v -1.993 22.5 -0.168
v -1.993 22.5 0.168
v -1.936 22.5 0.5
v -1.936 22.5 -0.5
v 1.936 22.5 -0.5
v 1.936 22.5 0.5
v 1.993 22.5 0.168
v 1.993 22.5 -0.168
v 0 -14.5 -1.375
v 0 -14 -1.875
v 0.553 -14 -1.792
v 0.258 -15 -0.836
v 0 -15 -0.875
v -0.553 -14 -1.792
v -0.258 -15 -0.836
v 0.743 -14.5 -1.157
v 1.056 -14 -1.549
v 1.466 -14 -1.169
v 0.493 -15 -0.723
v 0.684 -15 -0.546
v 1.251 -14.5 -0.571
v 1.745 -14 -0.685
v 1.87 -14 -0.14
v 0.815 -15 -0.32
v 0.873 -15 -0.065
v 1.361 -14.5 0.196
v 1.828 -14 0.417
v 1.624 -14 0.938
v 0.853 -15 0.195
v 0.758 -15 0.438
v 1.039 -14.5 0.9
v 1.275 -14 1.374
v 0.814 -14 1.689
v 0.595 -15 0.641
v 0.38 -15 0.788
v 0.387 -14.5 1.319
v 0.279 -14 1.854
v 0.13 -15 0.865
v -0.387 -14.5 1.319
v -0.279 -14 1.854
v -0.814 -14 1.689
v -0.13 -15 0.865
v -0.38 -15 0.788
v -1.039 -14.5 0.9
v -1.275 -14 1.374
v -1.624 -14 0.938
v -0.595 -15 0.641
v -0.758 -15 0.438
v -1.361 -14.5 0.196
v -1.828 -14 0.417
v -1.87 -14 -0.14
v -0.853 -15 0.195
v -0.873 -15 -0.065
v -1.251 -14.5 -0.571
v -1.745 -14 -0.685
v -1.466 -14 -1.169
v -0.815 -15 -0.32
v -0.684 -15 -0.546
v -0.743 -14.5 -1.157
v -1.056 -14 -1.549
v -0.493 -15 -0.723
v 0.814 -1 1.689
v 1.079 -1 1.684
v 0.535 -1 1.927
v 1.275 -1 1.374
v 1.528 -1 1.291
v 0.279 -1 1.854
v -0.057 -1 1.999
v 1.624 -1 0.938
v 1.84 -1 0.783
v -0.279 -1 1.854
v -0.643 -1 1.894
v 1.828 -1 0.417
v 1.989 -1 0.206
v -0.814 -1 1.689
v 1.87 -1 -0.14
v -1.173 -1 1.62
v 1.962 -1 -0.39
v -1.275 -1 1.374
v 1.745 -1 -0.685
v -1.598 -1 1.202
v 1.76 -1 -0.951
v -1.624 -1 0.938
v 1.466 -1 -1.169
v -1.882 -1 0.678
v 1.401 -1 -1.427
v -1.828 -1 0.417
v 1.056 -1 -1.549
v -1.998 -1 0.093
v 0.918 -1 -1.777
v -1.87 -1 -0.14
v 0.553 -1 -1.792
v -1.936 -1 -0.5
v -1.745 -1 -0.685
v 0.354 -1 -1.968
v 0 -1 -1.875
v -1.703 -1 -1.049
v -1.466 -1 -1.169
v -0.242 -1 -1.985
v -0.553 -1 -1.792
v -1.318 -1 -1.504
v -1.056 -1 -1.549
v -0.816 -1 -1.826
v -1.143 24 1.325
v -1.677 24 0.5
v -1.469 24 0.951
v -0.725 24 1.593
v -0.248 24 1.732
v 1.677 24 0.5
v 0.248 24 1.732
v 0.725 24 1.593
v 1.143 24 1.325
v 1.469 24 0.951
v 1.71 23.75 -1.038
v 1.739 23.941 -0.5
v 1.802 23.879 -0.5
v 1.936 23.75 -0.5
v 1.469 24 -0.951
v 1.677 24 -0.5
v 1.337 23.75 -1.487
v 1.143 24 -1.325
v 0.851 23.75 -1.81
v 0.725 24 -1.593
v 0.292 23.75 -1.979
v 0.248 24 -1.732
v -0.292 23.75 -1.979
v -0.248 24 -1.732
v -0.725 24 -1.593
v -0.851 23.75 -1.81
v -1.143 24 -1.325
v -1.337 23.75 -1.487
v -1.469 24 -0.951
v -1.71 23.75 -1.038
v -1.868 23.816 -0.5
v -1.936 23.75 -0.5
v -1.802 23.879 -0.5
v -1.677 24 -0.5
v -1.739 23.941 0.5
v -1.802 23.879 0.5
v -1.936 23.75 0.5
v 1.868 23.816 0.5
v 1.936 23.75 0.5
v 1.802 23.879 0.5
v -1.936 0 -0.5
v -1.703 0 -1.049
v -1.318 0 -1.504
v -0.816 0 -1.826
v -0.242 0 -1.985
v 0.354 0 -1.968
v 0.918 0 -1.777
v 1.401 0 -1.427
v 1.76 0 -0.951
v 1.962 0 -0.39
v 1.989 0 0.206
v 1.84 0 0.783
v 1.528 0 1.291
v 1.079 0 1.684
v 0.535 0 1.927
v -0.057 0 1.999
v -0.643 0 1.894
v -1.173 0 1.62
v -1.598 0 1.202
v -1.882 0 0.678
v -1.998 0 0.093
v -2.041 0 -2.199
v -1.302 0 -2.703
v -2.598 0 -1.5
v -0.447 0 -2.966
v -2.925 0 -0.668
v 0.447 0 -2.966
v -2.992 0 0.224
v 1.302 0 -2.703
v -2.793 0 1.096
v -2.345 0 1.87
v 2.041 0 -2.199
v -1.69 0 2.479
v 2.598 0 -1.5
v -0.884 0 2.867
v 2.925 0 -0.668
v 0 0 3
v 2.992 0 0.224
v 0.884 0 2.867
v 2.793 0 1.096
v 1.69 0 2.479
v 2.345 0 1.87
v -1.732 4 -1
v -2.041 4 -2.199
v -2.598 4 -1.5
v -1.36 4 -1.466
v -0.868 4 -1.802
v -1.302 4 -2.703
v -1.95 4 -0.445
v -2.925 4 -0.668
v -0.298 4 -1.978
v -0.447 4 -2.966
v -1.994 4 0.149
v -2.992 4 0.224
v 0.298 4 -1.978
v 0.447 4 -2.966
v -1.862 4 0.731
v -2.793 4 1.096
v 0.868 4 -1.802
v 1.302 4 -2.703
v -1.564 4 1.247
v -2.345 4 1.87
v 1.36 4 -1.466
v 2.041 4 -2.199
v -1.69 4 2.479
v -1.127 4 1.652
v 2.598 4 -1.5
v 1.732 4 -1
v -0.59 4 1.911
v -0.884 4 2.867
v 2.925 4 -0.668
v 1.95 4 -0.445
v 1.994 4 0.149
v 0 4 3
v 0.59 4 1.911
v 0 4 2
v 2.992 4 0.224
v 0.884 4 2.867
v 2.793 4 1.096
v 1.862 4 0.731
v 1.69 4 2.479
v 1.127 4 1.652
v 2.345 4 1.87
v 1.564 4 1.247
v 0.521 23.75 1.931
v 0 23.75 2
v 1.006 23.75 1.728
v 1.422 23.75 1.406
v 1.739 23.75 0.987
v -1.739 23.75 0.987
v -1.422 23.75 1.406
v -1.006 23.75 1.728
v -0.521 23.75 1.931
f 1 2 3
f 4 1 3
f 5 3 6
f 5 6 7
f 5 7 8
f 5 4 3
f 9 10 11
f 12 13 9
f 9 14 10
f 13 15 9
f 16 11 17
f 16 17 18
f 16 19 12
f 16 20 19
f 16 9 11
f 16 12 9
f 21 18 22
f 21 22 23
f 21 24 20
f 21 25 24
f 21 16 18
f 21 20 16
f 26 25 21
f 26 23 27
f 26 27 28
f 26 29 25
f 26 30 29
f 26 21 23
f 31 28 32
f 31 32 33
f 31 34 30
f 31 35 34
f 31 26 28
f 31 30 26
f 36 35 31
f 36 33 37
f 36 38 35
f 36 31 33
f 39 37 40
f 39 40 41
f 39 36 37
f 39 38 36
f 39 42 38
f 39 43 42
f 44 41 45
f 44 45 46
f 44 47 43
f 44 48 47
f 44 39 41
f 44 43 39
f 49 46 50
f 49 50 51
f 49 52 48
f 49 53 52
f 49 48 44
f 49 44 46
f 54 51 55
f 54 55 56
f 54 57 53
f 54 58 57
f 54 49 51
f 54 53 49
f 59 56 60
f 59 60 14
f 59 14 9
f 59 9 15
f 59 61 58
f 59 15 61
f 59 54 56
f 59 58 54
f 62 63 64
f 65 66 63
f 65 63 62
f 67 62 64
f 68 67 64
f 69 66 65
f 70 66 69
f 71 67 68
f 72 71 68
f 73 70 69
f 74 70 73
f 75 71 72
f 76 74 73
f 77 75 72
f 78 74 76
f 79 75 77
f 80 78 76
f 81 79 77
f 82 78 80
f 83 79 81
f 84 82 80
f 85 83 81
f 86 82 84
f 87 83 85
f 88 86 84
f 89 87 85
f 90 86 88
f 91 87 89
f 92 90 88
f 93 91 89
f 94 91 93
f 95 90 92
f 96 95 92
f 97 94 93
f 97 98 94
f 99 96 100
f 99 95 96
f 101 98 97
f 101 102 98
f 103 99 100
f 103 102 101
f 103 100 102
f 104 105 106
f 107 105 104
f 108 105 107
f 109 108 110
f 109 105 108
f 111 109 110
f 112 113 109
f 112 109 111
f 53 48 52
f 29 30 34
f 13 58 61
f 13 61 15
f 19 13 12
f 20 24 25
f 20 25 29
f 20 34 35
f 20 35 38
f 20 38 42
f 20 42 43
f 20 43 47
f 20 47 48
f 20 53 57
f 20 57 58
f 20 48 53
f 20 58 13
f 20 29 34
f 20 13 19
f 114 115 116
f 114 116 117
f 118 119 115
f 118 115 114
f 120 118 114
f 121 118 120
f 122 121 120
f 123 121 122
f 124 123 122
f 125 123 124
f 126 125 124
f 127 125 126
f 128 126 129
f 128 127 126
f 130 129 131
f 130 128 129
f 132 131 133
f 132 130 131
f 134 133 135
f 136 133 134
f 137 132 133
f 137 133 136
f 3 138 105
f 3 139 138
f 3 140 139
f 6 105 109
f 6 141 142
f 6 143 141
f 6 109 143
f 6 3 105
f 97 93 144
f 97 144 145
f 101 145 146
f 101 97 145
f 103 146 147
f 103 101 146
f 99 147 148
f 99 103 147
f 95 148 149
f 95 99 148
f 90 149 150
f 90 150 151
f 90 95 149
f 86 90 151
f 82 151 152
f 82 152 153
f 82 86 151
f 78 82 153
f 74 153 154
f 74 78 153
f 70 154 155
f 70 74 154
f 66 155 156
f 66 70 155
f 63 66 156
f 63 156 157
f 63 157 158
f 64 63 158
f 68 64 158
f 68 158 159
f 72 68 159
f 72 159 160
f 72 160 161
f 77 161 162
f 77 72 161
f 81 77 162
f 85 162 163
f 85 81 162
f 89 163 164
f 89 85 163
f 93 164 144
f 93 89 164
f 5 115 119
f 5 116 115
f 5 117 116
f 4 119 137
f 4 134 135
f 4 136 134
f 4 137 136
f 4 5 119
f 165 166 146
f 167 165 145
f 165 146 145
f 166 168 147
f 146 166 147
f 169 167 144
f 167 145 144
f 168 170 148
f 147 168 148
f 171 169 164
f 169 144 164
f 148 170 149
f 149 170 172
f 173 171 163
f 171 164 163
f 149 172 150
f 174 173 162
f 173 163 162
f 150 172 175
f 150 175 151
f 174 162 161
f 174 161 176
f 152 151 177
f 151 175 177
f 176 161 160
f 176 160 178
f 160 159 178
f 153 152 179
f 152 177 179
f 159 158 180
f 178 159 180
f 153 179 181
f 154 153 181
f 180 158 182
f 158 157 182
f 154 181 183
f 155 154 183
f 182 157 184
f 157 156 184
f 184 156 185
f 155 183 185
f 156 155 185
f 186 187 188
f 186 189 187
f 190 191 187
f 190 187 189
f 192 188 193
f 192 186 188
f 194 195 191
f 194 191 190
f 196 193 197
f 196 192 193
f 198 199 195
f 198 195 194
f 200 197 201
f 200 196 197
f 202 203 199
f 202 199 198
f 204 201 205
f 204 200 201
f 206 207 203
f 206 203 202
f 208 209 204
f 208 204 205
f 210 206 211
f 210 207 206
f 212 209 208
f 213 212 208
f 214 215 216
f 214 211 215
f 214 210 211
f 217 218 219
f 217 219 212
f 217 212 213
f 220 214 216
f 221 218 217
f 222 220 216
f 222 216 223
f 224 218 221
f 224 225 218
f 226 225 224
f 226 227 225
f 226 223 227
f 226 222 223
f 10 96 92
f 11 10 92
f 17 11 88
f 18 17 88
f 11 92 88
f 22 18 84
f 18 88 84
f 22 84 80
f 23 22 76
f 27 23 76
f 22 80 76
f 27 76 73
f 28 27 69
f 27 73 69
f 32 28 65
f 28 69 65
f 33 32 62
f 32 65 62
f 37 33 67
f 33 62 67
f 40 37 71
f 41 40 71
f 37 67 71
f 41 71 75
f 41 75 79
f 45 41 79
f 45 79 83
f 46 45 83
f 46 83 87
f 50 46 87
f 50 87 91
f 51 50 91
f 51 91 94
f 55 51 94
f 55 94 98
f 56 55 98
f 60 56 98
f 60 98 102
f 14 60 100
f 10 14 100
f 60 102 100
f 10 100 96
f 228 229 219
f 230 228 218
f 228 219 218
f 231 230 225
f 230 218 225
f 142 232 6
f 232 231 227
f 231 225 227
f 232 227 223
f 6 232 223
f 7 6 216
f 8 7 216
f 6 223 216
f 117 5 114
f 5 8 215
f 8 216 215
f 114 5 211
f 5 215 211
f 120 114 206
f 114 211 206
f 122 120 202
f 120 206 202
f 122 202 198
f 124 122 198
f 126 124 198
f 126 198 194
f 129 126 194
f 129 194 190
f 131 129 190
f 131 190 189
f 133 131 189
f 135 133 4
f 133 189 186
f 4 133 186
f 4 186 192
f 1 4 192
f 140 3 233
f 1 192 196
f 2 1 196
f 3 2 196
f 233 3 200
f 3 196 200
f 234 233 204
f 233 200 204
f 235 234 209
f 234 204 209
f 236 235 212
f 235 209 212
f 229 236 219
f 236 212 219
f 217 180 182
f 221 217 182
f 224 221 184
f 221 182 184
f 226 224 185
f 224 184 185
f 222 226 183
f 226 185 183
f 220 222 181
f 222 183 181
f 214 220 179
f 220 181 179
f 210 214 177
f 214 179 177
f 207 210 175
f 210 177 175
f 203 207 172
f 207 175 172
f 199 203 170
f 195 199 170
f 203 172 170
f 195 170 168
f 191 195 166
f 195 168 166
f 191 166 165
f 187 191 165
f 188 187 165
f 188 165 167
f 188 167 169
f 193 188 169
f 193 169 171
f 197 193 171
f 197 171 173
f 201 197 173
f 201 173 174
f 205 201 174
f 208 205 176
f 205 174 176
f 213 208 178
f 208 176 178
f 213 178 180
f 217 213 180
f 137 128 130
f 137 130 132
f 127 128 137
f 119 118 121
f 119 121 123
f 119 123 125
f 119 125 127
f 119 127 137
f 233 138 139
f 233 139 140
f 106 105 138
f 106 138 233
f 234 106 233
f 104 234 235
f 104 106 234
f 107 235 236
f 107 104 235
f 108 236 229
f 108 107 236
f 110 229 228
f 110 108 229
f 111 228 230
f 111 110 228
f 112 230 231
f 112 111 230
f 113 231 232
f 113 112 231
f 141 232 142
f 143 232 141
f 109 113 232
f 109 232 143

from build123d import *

# Parameters (mm, degrees)
ESQUISSE1_R             = 3
BOSS_EXTRU_1_DEPTH      = 4
ESQUISSE2_R             = 2
BOSS_EXTRU_2_DEPTH      = 20
CHANFREIN1_SIZE         = 0.25
ENL_V_START             = -1.5
ENL_V_MAT_EXTRU_1_DEPTH = 1.5
BOSS_EXTRU_3_START      = 1
ESQUISSE4_R             = 2
BOSS_EXTRU_3_DEPTH      = 1
ESQUISSE5_R             = 1.875
BOSS_EXTRU_4_DEPTH      = 14
CHANFREIN2_SIZE         = 1


with BuildPart() as part:
    # Esquisse1 → Boss.-Extru.1 (new body)
    with BuildSketch(Plane(origin=(0, 0, 0), x_dir=(1, 0, 0), z_dir=(0, 1, 0))):
        with Locations(Location((0, 0, 0), (0, 0, 270))):
            Circle(ESQUISSE1_R)
    extrude(amount=BOSS_EXTRU_1_DEPTH)

    # Esquisse2 → Boss.-Extru.2 (add)
    with BuildSketch(Plane(origin=(0, 4, 0), x_dir=(1, 0, 0), z_dir=(0, 1, 0))):
        with Locations(Location((0, 0, 0), (0, 0, 270))):
            Circle(ESQUISSE2_R)
    extrude(amount=BOSS_EXTRU_2_DEPTH)

    # Chanfrein1
    chanfrein1_edges = [part.edges().sort_by_distance(p)[0] for p in [
        (0, 24, -2),
    ]]
    chamfer(chanfrein1_edges, length=CHANFREIN1_SIZE)

    # Esquisse3 → Enlèv. mat.-Extru.1 (cut)
    with BuildSketch(Plane(origin=(0, 24, 0), x_dir=(1, 0, 0), z_dir=(0, 1, 0)).offset(ENL_V_START)):
        with BuildLine():
            Line((-1.936491673, -0.5), (1.936491673, -0.5))
            ThreePointArc((1.936491673, -0.5), (2, 0), (1.936491673, 0.5))
            Line((1.936491673, 0.5), (-1.936491673, 0.5))
            ThreePointArc((-1.936491673, 0.5), (-2, 0), (-1.936491673, -0.5))
        make_face()
    extrude(amount=ENL_V_MAT_EXTRU_1_DEPTH, mode=Mode.SUBTRACT)

    # Esquisse4 → Boss.-Extru.3 (add)
    with BuildSketch(Plane.XZ.offset(BOSS_EXTRU_3_START)):
        with Locations(Location((0, 0, 0), (0, 0, 194.477512186))):
            Circle(ESQUISSE4_R)
    extrude(amount=-BOSS_EXTRU_3_DEPTH)

    # Esquisse5 → Boss.-Extru.4 (add)
    with BuildSketch(Plane.XZ.offset(1)):
        with Locations(Location((0, 0, 0), (0, 0, 270))):
            Circle(ESQUISSE5_R)
    extrude(amount=BOSS_EXTRU_4_DEPTH)

    # Chanfrein2
    chanfrein2_edges = [part.edges().sort_by_distance(p)[0] for p in [
        (0, -15, 1.875),
    ]]
    chamfer(chanfrein2_edges, length=CHANFREIN2_SIZE)


solid = part.part
